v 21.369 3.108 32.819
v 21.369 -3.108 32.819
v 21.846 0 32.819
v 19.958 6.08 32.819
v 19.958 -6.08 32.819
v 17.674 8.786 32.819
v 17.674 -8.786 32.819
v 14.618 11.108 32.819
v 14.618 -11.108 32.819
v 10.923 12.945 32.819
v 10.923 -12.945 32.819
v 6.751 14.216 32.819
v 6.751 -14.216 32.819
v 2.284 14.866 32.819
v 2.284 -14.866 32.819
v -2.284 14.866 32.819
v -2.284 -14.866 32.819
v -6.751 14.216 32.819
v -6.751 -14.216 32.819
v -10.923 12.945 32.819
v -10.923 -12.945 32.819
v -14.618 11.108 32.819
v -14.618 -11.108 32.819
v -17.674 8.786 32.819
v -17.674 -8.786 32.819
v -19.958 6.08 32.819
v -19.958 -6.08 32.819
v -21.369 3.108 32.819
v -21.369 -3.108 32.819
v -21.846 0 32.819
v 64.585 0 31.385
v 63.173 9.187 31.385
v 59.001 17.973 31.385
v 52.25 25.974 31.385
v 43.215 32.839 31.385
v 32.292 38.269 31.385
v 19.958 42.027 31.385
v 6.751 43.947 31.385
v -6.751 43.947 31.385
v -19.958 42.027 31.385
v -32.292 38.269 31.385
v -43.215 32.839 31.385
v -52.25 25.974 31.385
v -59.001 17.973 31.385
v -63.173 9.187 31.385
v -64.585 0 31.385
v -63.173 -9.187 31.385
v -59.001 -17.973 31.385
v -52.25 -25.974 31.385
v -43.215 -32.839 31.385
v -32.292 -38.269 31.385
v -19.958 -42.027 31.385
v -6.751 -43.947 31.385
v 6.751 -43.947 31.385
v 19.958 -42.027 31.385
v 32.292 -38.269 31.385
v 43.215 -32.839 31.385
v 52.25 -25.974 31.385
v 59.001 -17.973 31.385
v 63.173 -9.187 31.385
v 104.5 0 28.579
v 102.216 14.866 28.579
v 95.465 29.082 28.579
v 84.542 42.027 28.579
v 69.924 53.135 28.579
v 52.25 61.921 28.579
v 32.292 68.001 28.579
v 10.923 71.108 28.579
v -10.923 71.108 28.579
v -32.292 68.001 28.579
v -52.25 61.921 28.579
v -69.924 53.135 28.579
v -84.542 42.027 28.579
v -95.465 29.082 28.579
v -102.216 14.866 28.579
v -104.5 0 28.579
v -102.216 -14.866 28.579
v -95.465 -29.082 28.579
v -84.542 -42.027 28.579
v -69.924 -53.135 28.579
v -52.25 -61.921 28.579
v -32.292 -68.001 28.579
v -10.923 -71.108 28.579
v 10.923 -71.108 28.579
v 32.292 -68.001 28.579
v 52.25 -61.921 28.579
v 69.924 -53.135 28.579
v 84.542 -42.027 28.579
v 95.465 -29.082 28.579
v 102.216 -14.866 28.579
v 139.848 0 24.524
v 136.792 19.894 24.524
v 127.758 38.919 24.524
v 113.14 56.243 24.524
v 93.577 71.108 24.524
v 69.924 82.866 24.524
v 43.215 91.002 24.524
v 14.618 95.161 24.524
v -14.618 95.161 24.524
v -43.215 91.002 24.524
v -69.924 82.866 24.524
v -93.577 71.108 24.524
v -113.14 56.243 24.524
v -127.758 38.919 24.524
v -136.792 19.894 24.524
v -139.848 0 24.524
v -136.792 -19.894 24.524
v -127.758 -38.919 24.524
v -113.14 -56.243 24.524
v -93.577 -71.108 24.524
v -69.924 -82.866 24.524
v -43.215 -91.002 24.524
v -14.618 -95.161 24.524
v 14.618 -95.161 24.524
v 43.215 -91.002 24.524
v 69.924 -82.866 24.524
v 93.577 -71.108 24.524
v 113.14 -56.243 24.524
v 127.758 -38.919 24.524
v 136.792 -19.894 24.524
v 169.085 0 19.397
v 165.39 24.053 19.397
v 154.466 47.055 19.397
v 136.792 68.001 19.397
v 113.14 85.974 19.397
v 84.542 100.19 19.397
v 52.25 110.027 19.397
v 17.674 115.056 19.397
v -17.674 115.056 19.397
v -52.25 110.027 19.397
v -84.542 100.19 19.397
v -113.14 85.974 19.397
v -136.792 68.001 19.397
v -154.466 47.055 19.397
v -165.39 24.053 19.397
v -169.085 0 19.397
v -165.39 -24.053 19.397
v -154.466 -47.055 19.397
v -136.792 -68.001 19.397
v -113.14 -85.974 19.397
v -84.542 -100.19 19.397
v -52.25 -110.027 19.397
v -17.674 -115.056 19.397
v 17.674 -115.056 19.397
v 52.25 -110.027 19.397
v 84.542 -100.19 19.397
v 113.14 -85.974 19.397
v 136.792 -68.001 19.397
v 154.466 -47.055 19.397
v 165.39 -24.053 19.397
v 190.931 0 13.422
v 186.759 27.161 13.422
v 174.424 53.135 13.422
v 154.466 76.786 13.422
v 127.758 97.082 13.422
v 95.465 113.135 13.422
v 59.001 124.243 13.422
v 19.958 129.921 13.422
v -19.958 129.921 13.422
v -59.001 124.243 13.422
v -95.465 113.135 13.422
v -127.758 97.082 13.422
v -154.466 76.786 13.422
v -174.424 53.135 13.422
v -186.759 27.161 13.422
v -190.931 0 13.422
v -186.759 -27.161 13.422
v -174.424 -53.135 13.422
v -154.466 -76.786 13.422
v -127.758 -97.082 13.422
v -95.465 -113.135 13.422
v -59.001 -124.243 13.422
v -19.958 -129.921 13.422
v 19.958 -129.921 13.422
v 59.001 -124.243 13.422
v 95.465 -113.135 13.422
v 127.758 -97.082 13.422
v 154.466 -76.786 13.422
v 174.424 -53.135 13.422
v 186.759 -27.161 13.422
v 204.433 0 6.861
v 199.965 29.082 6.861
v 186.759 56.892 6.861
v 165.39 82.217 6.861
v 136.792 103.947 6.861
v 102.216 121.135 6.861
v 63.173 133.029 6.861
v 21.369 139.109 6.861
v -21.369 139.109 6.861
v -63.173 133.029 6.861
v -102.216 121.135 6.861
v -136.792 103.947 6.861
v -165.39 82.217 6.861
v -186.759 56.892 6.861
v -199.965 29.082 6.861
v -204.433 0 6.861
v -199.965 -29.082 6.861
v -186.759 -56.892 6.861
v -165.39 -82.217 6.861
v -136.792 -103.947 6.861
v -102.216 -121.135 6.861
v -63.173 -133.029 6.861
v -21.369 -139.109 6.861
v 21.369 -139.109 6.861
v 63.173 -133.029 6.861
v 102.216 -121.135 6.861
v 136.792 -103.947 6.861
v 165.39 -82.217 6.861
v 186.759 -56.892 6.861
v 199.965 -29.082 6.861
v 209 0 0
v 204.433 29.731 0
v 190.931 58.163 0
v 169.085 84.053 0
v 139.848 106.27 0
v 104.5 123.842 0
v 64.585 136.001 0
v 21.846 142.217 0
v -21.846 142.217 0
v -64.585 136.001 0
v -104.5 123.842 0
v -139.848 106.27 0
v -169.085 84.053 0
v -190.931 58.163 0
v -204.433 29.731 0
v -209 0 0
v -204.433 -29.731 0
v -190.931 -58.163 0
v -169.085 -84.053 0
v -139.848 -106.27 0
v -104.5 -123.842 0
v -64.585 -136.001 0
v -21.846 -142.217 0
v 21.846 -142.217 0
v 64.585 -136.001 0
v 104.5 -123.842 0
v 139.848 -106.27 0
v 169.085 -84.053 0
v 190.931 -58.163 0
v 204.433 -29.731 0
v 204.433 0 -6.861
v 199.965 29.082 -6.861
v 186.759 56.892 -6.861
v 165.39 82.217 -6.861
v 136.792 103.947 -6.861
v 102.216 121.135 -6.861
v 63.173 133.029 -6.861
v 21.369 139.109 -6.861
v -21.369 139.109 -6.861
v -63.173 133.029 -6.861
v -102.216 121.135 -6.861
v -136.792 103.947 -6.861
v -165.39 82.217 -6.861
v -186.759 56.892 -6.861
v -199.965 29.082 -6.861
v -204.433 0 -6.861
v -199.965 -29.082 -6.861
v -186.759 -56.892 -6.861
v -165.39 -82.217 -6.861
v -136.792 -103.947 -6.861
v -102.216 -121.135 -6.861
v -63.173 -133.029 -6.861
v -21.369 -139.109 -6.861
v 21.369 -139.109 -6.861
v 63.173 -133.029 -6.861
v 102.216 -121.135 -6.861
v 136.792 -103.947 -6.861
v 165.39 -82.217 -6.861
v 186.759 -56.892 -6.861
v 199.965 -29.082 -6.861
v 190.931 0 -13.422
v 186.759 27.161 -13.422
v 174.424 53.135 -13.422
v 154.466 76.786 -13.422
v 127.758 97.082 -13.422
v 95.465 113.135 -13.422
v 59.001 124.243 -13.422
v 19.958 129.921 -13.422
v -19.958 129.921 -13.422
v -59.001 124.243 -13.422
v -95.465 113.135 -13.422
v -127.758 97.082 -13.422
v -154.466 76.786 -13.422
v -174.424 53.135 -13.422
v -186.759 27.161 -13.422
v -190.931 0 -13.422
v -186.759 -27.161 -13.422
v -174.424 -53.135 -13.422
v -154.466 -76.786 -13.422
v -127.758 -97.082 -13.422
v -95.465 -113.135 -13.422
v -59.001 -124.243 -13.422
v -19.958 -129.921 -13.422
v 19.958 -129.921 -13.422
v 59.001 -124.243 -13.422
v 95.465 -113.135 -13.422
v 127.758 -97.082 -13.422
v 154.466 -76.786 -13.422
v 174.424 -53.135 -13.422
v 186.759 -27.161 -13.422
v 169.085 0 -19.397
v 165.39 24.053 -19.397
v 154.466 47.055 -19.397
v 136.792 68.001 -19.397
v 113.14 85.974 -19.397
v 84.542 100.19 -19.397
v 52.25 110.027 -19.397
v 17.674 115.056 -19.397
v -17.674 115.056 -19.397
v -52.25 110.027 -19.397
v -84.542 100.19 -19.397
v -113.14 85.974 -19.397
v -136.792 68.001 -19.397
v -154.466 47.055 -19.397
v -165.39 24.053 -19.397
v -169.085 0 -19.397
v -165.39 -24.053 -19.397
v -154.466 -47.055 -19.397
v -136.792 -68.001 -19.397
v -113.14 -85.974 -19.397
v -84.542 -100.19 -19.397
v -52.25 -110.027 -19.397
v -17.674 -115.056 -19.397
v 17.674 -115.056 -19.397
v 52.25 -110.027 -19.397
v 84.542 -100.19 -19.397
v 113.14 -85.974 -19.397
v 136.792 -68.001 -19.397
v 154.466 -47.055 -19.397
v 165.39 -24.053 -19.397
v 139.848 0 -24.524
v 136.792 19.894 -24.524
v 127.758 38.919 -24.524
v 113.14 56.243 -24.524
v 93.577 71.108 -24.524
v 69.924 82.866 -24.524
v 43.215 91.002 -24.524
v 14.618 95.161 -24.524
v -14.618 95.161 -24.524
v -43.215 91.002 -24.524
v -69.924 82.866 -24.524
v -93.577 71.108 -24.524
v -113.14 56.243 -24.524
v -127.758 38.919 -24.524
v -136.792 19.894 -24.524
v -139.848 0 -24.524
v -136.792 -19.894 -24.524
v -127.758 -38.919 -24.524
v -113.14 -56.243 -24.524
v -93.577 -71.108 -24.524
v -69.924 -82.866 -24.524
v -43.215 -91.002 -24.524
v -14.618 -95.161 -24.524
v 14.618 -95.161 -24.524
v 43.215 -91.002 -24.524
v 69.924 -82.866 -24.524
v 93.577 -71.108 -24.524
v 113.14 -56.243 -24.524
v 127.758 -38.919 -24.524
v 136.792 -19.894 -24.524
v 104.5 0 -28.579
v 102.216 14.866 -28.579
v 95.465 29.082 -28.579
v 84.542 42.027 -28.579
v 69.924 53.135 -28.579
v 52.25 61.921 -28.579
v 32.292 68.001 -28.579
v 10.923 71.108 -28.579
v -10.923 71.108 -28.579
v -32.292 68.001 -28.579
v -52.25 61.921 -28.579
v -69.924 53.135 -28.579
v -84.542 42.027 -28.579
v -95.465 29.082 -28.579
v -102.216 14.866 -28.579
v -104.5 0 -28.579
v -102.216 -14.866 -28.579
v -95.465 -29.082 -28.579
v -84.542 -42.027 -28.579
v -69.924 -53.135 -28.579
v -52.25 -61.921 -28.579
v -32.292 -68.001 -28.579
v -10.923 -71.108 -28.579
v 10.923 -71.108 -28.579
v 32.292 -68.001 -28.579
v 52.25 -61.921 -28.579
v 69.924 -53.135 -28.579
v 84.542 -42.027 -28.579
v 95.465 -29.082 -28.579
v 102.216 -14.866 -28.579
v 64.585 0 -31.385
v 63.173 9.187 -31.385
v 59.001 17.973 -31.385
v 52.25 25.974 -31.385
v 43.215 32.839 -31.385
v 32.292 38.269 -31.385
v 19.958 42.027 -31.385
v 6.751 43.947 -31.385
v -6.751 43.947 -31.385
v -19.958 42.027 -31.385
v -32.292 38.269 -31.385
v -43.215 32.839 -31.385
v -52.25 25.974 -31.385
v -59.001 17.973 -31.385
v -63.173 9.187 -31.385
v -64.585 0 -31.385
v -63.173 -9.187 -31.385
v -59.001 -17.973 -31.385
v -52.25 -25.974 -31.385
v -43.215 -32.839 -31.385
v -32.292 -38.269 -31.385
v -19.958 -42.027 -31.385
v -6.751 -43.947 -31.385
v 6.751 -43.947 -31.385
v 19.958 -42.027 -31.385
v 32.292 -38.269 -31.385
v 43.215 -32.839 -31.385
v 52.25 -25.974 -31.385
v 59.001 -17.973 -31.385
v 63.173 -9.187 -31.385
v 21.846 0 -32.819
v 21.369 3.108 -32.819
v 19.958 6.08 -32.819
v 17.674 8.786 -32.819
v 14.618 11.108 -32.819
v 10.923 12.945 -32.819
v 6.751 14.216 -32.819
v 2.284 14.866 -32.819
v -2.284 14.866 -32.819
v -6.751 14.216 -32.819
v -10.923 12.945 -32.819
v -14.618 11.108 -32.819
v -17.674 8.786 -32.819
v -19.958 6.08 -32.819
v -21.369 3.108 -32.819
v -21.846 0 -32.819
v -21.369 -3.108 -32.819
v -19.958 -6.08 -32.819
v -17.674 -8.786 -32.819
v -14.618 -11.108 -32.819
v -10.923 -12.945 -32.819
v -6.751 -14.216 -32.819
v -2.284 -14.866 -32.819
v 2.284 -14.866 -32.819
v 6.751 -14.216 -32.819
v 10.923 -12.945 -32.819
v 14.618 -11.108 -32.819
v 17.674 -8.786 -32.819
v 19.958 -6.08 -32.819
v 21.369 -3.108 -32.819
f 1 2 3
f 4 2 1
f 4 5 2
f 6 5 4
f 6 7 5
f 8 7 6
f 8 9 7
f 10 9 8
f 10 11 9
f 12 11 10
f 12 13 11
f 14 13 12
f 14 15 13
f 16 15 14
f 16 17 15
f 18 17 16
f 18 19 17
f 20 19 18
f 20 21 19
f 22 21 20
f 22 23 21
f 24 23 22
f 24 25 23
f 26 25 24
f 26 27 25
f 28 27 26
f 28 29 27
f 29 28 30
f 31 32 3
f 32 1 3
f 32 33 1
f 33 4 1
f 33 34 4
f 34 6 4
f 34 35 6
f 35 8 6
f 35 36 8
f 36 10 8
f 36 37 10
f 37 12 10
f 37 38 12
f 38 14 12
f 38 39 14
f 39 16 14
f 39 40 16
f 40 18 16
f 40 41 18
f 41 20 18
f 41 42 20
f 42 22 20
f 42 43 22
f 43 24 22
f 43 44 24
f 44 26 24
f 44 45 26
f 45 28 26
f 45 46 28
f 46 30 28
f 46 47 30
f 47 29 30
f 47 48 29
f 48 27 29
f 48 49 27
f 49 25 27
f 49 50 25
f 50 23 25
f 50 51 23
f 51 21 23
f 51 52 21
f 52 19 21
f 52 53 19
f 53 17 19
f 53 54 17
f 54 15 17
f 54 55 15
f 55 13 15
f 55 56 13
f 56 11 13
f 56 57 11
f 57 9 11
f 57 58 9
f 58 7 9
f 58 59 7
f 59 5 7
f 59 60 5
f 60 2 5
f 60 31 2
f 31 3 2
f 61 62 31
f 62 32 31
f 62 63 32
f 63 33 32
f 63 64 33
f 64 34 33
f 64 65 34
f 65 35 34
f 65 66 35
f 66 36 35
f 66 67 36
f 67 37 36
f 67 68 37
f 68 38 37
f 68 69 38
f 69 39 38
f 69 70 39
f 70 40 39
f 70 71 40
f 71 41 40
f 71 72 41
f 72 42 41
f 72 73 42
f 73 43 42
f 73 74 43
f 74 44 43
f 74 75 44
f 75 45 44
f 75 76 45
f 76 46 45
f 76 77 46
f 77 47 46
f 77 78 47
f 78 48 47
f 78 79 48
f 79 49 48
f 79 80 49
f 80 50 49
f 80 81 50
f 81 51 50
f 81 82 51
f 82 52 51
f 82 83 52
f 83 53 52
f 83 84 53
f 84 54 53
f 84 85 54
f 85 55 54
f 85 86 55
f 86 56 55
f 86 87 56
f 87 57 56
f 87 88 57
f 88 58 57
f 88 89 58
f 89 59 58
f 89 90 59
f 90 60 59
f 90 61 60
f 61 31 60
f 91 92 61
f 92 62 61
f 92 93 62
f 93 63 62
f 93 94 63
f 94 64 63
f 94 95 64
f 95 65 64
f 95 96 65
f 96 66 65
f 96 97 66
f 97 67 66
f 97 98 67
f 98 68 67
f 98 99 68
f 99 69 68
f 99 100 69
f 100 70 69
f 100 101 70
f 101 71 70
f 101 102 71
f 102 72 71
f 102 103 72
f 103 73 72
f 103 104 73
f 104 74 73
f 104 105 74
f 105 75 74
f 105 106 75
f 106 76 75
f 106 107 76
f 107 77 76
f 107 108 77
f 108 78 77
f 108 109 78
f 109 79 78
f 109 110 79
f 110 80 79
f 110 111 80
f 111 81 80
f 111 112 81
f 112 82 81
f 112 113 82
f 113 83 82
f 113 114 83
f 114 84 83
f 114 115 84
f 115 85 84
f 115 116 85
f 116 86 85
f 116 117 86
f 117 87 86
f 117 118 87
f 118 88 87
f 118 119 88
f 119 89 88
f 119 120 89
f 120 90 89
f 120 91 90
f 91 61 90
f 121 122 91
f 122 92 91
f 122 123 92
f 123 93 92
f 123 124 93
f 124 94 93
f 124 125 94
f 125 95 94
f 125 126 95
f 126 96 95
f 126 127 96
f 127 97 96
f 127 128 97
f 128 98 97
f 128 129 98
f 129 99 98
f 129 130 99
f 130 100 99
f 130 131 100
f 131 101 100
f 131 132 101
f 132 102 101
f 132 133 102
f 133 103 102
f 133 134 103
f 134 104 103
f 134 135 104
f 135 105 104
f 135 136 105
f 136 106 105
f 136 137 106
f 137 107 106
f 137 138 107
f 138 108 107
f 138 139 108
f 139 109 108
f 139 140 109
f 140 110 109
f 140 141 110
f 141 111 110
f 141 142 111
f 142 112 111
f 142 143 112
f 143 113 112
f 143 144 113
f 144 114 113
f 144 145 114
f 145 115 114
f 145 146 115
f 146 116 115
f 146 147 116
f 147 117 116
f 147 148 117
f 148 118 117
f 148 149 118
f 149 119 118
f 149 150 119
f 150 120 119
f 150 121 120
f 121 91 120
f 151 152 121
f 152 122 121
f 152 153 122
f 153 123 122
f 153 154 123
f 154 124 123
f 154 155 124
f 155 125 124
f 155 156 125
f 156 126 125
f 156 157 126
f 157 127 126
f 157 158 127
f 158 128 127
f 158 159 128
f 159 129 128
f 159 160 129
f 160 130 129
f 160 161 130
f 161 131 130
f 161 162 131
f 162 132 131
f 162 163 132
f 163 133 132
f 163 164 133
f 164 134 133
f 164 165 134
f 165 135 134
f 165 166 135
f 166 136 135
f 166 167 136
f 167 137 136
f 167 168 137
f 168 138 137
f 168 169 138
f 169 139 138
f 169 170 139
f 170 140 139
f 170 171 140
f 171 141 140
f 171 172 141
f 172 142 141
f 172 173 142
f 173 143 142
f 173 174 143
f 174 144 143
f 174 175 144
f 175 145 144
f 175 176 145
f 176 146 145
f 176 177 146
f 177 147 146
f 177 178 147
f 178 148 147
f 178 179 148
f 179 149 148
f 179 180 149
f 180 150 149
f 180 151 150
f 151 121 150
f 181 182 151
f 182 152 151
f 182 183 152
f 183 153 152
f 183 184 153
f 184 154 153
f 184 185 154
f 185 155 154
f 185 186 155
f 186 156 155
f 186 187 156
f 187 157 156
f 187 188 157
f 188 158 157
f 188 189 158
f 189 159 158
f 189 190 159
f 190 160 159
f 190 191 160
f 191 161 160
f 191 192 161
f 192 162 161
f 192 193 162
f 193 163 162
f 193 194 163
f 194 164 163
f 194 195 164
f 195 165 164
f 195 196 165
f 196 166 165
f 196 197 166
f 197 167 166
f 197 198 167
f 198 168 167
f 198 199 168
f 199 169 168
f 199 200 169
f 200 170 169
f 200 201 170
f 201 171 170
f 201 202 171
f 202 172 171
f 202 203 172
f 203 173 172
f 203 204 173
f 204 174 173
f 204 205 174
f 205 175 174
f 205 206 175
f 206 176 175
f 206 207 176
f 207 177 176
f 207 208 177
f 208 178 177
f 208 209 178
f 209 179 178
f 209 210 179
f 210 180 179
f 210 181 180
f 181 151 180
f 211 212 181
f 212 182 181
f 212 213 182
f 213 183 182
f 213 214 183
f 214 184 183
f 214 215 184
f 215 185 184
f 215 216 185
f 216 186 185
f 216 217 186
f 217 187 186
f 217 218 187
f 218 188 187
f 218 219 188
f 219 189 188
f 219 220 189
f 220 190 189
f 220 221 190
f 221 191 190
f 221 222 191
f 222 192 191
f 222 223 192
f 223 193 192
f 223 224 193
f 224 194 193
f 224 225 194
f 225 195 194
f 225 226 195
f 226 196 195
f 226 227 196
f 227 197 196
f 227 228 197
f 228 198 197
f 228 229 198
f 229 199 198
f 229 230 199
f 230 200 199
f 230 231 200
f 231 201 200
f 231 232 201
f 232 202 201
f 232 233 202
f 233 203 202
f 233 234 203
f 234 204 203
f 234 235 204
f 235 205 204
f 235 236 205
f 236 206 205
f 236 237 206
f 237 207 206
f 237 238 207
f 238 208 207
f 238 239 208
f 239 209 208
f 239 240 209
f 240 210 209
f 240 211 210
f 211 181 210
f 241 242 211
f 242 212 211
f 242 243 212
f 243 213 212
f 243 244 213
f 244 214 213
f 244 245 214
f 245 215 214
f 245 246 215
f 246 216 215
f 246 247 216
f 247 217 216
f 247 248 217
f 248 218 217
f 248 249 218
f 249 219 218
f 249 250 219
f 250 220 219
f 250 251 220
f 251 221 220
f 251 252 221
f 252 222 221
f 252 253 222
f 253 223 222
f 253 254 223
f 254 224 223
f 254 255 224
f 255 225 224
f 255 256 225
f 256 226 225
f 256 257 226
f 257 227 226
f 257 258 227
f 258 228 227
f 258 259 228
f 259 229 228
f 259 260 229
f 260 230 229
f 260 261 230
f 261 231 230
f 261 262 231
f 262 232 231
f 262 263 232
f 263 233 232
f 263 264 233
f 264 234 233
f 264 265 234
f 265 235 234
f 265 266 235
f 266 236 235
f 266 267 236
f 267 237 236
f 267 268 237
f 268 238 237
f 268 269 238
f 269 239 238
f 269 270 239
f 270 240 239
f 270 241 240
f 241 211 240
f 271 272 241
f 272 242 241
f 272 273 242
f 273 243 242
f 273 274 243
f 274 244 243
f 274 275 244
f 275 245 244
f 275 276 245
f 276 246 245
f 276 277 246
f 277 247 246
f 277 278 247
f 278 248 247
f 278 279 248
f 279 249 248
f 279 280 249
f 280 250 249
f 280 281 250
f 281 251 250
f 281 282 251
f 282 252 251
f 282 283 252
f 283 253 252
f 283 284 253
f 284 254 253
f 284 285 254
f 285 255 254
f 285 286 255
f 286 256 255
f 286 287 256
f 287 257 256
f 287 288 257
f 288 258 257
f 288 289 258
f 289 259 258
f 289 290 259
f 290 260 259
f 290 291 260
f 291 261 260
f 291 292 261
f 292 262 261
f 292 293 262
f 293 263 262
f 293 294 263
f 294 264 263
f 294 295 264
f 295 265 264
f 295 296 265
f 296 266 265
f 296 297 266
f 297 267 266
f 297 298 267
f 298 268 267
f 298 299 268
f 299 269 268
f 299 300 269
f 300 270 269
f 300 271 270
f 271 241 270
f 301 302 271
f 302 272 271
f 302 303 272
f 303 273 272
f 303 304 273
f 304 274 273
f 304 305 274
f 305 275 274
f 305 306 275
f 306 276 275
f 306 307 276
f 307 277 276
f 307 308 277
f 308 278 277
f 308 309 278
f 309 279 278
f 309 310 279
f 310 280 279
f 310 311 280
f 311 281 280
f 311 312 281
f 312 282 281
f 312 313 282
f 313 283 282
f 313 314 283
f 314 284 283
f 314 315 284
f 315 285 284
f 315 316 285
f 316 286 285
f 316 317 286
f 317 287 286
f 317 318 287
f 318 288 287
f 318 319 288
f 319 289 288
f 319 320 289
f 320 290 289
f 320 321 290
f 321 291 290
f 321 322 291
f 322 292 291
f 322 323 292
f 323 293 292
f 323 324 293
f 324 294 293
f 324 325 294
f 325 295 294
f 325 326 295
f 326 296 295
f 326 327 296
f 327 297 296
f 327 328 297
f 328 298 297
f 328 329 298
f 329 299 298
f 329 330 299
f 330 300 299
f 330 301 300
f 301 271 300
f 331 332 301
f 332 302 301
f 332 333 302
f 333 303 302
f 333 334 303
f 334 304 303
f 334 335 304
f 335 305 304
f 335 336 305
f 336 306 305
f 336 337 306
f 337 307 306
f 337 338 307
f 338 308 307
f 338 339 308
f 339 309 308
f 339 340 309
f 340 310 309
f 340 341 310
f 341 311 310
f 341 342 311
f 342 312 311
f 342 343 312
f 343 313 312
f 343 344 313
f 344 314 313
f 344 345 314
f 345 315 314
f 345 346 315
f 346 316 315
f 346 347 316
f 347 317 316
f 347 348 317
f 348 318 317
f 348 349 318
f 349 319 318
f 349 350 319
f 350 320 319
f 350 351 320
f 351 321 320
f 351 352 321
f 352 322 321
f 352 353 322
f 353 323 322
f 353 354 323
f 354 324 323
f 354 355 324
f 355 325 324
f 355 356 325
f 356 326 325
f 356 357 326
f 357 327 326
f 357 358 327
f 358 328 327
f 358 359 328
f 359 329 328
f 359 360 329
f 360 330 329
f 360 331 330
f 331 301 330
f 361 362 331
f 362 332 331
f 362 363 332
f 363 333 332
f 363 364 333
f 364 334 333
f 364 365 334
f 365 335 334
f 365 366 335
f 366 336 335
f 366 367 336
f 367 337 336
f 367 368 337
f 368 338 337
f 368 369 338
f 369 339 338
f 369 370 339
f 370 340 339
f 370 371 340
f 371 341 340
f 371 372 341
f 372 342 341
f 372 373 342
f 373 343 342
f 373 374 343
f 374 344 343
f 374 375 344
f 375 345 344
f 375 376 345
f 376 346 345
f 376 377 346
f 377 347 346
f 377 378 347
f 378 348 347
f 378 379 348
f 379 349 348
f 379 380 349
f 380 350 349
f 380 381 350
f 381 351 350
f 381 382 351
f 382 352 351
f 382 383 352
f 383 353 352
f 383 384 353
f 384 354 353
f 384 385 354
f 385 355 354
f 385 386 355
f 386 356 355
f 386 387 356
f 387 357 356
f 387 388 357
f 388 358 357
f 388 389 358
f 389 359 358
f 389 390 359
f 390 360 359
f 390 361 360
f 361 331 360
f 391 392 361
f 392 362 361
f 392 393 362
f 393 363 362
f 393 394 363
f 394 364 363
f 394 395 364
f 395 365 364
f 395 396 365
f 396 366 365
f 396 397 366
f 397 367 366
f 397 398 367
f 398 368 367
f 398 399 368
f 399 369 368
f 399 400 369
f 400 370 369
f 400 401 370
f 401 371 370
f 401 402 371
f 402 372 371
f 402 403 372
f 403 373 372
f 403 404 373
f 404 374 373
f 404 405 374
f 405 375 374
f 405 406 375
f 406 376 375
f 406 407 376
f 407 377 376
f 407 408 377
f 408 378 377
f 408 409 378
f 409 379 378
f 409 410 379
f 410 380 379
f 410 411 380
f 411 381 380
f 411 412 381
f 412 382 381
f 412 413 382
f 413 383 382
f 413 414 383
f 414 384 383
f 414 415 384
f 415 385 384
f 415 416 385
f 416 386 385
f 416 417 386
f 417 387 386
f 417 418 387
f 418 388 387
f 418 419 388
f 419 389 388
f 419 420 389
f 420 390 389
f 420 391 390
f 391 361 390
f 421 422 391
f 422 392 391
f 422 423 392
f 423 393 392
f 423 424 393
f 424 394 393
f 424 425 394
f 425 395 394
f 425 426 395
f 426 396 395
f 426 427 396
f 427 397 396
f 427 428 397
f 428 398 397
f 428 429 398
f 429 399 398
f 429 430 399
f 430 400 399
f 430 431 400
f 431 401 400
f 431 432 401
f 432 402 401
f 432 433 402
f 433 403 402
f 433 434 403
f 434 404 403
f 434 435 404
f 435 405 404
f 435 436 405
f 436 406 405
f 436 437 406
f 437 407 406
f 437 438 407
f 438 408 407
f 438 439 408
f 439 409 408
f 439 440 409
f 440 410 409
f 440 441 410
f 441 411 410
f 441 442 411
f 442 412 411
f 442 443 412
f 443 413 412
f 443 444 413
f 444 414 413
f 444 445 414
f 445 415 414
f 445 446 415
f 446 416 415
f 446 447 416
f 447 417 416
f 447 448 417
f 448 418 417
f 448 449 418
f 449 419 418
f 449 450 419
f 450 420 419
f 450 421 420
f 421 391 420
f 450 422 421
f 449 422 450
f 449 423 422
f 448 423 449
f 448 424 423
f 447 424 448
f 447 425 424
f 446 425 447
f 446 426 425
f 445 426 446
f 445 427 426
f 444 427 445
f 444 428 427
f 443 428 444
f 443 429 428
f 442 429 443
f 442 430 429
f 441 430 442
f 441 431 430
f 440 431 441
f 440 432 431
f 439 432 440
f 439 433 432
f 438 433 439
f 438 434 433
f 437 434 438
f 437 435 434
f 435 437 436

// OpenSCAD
// Generated by SolidPython 1.0.1 on 2020-07-29 00:46:54


scale(v = [19, 13, 3]) {
	sphere(r = 11);
}
/***********************************************
*********      SolidPython code:      **********
************************************************
 
# import packages: SolidPython
from solid import *
from solid.utils import *
from itertools import chain, combinations, permutations


class Resize:

    def __init__(self, scad_file):
        self.scad_file = scad_file
        #self.scad_file = import_scad(scad_file)
        # cone/cylinder param:
        self.r1 = 0
        self.r2 = 0
        self.h = 0
        # rectangular prism param:
        self.w = 0
        self.l = 0
        # ellipse param:
        self.r = 0

    # import OpenScad code (file name corresponds to shape)


    # classify shape + parameters
    def assign(self, param1, param2, param3):
        if self.scad_file == 'cone.scad':
            self.r1 = param1
            self.r2 = param2
            self.h = param3
        elif self.scad_file == 'cylinder.scad':
            self.r1 = param1
            self.r2 = param2
            self.h = param3
        elif self.scad_file == 'rectangularPrism.scad':
            self.h = param1
            self.l = param2
            self.w = param3
        else:
            self.r = param1
            self.h = param2

    # resize parameters
    def iterate(self):
        x = range(3, 20, 2)
        i = 1
        if self.scad_file == 'cone.scad':
            tempList = list(permutations(x, 2))
            for temp in tempList:
                param1 = temp[0]
                param2 = temp[1]
                filepath = 'produced_scad_files/' + 'cone' + str(param1) + '_' + str(param2) + '_' + '.scad'
                scad_render_to_file(cylinder(h=param1, r1=param2, r2=0), filepath)

        elif self.scad_file == 'cylinder.scad':
            tempList = list(permutations(x, 3))
            for temp in tempList:
                param1 = temp[0]
                param2 = temp[1]
                filepath = 'produced_scad_files/' + 'cylinder' + str(param1) + '_' + str(param2) + '_' + '.scad'
                scad_render_to_file(cylinder(h=param1, r1=param2, r2=param2), filepath)

        elif self.scad_file == 'rectangularPrism.scad':
            tempList = list(permutations(x, 3))
            for temp in tempList:
                param1 = temp[0]
                param2 = temp[1]
                param3 = temp[2]
                filepath = 'produced_scad_files/' + 'rectangularPrism' + str(param1) + '_' + str(param2) + '_' + str(
                    param3) + '.scad'
                scad_render_to_file(cube(size=(param1, param2, param3)), filepath)

        elif self.scad_file == 'ellipse.scad':
            tempList = list(permutations(x, 4))
            for temp in tempList:
                param1 = temp[0]
                param2 = temp[1]
                param3 = temp[2]
                param4 = temp[3]
                filepath = 'produced_scad_files/' + 'ellipse' + str(param1) + '_' + str(param2) + '_' + str(param3) + '_' + str(param4) + '.scad'
                scad_render_to_file(scale([param1, param2, param3])(sphere(r=param4)), filepath)

    def render_to_scadfile(self):
        scad_render_to_file(scad, 'example.scad') 
 
************************************************/
